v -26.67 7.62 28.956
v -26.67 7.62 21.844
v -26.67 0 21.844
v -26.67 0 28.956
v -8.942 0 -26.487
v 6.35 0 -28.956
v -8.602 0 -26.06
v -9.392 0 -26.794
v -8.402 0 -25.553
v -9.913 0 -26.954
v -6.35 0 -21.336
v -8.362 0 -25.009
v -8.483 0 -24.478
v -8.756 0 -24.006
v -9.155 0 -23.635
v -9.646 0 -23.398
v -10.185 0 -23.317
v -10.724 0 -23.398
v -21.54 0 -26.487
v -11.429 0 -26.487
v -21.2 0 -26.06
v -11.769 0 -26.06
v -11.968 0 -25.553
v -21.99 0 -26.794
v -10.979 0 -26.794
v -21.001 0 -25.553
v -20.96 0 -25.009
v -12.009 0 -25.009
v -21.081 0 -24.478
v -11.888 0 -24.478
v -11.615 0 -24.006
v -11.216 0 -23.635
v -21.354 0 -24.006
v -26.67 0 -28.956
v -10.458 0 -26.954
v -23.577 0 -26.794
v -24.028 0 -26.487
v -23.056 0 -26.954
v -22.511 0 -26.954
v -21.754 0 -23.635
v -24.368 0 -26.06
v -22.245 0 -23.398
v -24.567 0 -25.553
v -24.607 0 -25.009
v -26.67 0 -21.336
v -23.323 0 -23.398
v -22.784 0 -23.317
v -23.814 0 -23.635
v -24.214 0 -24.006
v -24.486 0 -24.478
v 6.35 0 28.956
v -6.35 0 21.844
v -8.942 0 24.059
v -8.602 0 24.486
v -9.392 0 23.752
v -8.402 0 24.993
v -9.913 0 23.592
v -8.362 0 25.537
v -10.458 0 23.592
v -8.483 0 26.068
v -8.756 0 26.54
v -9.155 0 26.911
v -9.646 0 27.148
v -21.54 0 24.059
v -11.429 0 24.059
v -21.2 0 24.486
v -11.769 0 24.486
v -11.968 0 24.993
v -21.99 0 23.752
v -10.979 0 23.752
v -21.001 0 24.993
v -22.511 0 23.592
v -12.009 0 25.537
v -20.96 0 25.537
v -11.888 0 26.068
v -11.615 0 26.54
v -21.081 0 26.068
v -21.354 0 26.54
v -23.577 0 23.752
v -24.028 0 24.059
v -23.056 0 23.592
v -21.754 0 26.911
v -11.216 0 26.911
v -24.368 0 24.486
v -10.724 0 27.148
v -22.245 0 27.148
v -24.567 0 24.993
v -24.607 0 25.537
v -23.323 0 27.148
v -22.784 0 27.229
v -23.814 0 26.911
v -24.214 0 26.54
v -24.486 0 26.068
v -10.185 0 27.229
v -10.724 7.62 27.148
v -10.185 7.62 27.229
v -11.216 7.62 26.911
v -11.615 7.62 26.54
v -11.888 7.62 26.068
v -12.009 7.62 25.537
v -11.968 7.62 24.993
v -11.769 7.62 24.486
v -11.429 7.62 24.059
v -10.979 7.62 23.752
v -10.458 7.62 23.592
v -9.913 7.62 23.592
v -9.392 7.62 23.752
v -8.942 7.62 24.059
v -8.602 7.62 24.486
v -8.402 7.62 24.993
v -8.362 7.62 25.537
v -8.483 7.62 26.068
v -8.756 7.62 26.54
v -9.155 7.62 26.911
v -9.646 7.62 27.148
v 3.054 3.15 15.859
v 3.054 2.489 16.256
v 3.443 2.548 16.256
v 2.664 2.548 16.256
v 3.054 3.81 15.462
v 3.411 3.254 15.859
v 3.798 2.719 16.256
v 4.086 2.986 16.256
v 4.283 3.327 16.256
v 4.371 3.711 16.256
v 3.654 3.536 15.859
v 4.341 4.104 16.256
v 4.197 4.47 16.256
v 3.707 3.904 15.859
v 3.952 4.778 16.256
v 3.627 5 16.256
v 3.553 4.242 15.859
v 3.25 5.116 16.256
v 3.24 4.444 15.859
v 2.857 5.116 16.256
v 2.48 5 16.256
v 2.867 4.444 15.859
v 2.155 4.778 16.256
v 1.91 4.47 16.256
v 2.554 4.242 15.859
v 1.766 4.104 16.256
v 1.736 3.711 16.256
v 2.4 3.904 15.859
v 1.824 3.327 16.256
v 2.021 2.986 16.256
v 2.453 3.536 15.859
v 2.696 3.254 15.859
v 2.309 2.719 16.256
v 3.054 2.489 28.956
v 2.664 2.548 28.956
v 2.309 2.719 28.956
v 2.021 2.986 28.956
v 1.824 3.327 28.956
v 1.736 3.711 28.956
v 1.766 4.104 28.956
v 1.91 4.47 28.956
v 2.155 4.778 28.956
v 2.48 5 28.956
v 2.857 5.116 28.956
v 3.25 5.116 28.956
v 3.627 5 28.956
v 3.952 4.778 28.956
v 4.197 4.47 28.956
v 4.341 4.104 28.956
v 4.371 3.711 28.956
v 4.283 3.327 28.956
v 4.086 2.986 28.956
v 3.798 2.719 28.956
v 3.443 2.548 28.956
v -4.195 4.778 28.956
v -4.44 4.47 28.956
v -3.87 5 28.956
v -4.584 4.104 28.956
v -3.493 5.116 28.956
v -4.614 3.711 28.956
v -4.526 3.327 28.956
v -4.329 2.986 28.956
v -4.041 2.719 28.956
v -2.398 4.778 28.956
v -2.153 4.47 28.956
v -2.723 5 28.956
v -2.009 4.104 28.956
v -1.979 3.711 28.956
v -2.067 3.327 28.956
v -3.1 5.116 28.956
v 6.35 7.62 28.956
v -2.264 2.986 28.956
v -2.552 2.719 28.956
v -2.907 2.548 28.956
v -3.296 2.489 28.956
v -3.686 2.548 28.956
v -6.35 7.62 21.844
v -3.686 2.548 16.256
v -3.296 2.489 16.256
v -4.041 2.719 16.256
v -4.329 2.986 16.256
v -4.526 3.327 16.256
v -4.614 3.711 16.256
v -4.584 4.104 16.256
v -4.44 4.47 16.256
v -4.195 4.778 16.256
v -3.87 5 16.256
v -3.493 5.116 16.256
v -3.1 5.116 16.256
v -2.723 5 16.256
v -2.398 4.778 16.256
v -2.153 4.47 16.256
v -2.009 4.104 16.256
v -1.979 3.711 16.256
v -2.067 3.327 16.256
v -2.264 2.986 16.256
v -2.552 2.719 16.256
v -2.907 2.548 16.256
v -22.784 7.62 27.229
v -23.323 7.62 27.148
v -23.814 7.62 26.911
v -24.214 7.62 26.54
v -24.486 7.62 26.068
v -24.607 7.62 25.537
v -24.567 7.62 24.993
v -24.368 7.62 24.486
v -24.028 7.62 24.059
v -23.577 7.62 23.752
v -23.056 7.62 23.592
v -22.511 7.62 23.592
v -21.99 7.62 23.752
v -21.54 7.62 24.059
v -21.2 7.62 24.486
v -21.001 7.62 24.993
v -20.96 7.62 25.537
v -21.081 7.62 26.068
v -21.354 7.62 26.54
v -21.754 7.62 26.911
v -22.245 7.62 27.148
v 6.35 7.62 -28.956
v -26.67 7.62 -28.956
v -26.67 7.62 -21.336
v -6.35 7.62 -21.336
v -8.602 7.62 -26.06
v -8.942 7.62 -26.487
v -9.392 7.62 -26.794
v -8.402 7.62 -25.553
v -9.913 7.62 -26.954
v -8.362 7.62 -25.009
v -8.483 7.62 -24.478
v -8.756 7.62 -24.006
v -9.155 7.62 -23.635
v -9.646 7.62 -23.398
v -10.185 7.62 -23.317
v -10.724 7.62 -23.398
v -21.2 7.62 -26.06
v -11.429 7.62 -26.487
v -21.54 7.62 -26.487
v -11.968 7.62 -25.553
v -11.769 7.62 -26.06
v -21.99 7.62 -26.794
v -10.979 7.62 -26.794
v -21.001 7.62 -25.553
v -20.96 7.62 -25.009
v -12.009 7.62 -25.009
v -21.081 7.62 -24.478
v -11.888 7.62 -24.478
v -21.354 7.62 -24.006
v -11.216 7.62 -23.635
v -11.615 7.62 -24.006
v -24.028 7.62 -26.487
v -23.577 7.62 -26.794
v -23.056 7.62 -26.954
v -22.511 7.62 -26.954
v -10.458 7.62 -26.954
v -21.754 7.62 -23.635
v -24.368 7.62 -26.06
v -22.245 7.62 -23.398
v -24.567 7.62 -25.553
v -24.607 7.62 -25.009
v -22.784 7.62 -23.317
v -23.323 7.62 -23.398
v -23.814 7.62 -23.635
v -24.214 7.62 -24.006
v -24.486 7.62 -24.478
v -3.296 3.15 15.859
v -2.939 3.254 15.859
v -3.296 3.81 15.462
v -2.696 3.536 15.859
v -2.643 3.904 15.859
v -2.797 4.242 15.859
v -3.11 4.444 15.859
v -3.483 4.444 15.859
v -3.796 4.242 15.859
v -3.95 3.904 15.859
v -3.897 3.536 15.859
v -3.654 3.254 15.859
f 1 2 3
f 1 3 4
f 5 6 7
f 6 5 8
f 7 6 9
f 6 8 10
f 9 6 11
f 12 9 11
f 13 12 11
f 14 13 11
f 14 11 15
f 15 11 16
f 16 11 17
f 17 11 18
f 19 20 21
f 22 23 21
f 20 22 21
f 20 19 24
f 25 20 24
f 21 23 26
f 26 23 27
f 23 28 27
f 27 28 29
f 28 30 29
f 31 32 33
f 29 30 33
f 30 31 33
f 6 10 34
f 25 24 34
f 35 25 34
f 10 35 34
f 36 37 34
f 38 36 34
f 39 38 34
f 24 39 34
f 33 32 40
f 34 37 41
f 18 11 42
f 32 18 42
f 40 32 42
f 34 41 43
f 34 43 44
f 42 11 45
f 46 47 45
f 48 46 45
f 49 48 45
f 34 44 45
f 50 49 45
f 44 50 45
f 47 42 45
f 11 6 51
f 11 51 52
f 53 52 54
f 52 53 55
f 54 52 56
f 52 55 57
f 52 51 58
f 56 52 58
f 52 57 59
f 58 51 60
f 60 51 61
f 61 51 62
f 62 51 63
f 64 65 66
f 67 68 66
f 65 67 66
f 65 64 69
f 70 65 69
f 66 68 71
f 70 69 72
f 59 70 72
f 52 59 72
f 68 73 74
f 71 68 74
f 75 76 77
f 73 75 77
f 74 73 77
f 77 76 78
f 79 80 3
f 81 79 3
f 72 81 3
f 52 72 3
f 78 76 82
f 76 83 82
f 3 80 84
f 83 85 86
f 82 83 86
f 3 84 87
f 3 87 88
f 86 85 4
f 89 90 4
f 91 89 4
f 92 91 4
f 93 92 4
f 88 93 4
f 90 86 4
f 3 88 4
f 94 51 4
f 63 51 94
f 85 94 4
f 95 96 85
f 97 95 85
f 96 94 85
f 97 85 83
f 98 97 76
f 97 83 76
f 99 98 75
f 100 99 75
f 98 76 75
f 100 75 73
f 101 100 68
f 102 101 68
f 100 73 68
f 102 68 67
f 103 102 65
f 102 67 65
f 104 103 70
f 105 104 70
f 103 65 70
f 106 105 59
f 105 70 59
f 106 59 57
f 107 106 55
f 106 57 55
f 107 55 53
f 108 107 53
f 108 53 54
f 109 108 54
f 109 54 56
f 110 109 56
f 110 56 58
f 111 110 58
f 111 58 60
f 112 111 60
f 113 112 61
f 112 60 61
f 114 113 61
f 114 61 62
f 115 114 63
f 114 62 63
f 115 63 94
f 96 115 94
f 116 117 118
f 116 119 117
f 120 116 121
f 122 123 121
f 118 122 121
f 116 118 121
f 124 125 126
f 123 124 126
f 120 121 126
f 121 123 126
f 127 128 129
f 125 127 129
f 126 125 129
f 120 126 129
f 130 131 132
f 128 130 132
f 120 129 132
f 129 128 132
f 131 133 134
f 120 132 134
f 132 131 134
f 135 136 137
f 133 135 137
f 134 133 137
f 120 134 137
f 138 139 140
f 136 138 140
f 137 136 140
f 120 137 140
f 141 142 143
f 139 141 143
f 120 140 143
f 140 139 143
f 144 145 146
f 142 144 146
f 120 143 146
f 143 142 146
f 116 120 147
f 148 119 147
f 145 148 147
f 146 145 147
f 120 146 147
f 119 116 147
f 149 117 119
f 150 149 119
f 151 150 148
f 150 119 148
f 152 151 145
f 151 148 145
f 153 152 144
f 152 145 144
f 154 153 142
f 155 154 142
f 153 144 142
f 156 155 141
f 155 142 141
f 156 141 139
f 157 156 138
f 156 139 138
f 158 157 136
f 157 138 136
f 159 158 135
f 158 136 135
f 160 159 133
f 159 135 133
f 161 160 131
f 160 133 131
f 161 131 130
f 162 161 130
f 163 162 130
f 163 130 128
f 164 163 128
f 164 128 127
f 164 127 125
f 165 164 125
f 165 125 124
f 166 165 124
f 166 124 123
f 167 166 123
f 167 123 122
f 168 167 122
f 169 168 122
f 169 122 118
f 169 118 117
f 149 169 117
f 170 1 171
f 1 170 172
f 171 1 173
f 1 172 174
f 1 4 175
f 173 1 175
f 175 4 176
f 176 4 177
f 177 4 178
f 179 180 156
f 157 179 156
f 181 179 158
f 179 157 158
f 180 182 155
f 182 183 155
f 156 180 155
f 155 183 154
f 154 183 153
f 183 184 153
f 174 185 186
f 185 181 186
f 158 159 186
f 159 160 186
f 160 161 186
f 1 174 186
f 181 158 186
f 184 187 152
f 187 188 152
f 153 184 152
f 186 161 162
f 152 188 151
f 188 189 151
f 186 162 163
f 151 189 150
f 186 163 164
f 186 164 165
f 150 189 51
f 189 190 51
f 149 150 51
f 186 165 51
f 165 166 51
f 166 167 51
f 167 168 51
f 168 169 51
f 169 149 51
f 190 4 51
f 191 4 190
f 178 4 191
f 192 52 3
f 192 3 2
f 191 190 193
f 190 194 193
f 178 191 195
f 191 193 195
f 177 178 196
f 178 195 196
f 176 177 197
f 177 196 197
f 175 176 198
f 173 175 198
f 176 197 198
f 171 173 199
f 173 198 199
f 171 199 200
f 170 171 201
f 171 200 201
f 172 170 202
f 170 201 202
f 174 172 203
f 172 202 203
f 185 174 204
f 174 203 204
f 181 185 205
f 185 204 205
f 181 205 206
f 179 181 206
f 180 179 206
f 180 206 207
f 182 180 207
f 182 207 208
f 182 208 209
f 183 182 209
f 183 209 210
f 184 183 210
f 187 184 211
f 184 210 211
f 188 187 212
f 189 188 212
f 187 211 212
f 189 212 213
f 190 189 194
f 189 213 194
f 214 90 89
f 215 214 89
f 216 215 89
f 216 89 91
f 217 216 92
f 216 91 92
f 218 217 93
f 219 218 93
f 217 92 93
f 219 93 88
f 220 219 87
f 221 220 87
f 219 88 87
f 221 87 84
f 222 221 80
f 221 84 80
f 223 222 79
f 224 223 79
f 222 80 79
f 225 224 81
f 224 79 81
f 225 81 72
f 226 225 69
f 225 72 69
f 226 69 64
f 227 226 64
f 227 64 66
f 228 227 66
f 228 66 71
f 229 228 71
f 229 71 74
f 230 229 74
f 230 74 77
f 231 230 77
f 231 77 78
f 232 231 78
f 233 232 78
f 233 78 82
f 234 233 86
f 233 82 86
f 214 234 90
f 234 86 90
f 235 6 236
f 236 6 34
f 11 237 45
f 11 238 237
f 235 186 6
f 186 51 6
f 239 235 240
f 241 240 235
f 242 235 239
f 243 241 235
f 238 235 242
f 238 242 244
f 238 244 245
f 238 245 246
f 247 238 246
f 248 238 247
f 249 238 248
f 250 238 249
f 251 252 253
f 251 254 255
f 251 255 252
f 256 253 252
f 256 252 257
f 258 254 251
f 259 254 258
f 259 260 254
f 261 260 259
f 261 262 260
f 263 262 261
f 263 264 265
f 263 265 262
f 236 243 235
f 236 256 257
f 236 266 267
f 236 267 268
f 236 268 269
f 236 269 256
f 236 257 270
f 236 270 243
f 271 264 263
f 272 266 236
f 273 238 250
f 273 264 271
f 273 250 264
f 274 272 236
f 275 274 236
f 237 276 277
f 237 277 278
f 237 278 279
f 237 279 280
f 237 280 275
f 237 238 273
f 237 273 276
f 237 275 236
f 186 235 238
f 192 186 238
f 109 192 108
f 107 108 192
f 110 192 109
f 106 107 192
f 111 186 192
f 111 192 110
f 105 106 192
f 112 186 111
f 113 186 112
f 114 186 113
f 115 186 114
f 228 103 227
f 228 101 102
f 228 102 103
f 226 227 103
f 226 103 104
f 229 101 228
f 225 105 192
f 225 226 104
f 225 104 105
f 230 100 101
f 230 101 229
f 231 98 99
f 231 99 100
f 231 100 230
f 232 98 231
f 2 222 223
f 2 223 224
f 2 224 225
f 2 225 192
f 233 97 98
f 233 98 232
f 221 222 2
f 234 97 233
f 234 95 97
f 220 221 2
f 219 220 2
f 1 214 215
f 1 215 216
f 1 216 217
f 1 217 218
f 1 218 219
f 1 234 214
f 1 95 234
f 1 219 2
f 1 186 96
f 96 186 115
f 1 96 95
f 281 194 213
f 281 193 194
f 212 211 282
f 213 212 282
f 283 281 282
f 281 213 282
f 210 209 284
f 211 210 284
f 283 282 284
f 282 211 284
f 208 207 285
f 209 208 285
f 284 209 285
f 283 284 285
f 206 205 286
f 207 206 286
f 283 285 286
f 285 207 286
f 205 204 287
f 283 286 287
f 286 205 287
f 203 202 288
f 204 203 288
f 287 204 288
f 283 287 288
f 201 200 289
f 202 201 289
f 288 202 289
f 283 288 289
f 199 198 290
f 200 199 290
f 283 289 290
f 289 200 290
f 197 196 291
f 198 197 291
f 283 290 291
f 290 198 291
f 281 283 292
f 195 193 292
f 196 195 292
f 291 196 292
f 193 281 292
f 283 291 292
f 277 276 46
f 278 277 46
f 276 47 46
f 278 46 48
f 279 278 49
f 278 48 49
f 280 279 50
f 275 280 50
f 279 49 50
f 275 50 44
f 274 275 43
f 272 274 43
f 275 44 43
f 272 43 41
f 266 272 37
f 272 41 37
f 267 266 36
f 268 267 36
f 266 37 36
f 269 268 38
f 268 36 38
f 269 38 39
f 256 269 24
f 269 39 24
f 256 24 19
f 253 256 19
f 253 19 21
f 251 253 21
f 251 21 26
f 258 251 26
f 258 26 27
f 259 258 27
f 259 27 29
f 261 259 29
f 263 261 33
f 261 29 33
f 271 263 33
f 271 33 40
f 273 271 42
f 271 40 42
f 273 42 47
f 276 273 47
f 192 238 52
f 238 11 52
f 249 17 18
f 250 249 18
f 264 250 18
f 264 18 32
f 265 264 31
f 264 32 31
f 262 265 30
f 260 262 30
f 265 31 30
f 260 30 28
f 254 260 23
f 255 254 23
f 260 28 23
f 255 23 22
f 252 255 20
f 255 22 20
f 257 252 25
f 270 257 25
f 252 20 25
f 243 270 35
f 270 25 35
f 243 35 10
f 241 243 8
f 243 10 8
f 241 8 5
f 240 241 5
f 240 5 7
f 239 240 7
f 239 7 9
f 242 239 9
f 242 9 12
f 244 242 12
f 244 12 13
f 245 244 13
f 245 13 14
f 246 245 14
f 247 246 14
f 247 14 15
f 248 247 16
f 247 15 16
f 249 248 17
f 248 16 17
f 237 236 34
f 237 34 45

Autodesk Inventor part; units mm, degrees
ref_plane "YZ Plane" through (0, 0, 0) normal (1, 0, 0) x (0, 1, 0)
ref_plane "XZ Plane" through (0, 0, 0) normal (0, 1, 0) x (-1, 0, 0)
ref_plane "XY Plane" through (0, 0, 0) normal (0, 0, 1) x (1, 0, 0)
sketch "Sketch4" plane through (0, 0, 0) normal (0, 1, 0) x (-1, 0, 0)
  line L0 (-6.35, -28.956) -> (6.35, -28.956)
  line L1 (6.35, -28.956) -> (6.35, 28.956)
  line L2 (6.35, 28.956) -> (-6.35, 28.956)
  line L3 (-6.35, 28.956) -> (-6.35, -28.956)
  line L4 (-6.35, -28.956) -> (6.35, 28.956) construction
  line L5 (6.35, -28.956) -> (-6.35, 28.956) construction
  point P0 (0, 0)
  dimension "d14" = 12.7
  dimension "d15" = 57.912
extrude "Extrusion3" add sketch "Sketch4" along normal blind 7.62
sketch "Sketch5" plane through (-6.35, 0, -28.956) normal (-1, 0, 0) x (0, 0, 1)
  line L0 (0, 0) -> (57.912, 0) projected
  line L1 (57.912, 0) -> (57.912, 7.62) projected
  line L2 (0, 7.62) -> (57.912, 7.62) projected
  line L3 (0, 7.62) -> (7.62, 7.62)
  line L4 (7.62, 7.62) -> (7.62, 0)
  line L5 (7.62, 0) -> (0, 0)
  line L6 (0, 0) -> (0, 7.62)
  line L7 (57.15, 0) -> (50.8, 0)
  line L8 (50.8, 0) -> (50.8, 7.62)
  line L9 (50.8, 7.62) -> (57.912, 7.62)
  line L10 (57.912, 0) -> (57.15, 0)
  point P0 (28.956, 0)
  dimension "d18" = 7.62
  dimension "d21" = 50.8
extrude "Extrusion4" add sketch "Sketch5" along normal blind 20.32 contours L6 L2 L4 L0 | L8 L2 L1 L0
sketch "Sketch6" plane through (0, 7.62, 0) normal (0, 1, 0) x (1, 0, 0)
  line L0 (6.35, -28.956) -> (-26.67, -28.956) projected
  line L1 (6.35, -28.956) -> (6.35, 28.956) projected
  line L2 (-22.7838, 26.9211) -> (-22.7838, -27.5281) construction
  line L3 (-10.1854, 26.9211) -> (-10.1854, -27.5281) construction
  line L4 (-7.0821, 25.146) -> (-30.0582, 25.146) construction
  line L5 (-5.6948, -25.4) -> (-30.0582, -25.4) construction
  point P0 (-26.67, 28.956)
  point P1 (-26.67, 21.336)
  point P2 (-26.67, -21.844)
  point P3 (0, 0)
  point P4 (-22.7838, 25.146)
  point P5 (-10.1854, 25.146)
  point P6 (-10.1854, -25.4)
  point P7 (-22.7838, -25.4)
  dimension "d26" = 3.556
  dimension "d27" = 3.81
  dimension "d28" = 3.8862
  dimension "d29" = 12.5984
  dimension "d30" = 16.4846
hole "Hole1" at (-22.7838, 7.62, -25.146) at (-10.1854, 7.62, -25.146) at (-10.1854, 7.62, 25.4) at (-22.7838, 7.62, 25.4) direction (0, -1, 0) diameter 3.6576 end up to surface clearance for "Flat Head Machine Screw (82)" size "#6" standard "Ansi Unified Screw Threads"
sketch "Sketch7" plane through (6.35, 0, 28.956) normal (0, 0, 1) x (1, 0, 0)
  line L0 (0, 0) -> (-33.02, 0) projected
  line L1 (0, 0) -> (0, 7.62) projected
  line L2 (0, 7.62) -> (-33.02, 7.62) projected
  line L3 (-12.7, 0) -> (-12.7, 7.62) projected
  line L4 (-12.7, 7.62) -> (-12.7, 0) projected
  line L5 (-6.5931, 0) -> (-6.5931, 7.62) construction
  line L6 (-12.7, 3.81) -> (-6.5931, 3.81) construction
  line L7 (0, 3.81) -> (-6.5931, 3.81) construction
  point P0 (-6.35, 0)
  point P1 (-9.6465, 3.81)
  point P2 (-3.2965, 3.81)
  dimension "d38" = 6.5931
hole "Hole2" at (-3.2965, 3.81, 28.956) at (3.0535, 3.81, 28.956) direction (0, 0, -1) diameter 2.6416 depth 12.7 tip angle 118 thread size "6-32 UNC" class "2B" standard "ANSI Unified Screw Threads"
properties part number "servo_mount" material "Aluminum 6061"
